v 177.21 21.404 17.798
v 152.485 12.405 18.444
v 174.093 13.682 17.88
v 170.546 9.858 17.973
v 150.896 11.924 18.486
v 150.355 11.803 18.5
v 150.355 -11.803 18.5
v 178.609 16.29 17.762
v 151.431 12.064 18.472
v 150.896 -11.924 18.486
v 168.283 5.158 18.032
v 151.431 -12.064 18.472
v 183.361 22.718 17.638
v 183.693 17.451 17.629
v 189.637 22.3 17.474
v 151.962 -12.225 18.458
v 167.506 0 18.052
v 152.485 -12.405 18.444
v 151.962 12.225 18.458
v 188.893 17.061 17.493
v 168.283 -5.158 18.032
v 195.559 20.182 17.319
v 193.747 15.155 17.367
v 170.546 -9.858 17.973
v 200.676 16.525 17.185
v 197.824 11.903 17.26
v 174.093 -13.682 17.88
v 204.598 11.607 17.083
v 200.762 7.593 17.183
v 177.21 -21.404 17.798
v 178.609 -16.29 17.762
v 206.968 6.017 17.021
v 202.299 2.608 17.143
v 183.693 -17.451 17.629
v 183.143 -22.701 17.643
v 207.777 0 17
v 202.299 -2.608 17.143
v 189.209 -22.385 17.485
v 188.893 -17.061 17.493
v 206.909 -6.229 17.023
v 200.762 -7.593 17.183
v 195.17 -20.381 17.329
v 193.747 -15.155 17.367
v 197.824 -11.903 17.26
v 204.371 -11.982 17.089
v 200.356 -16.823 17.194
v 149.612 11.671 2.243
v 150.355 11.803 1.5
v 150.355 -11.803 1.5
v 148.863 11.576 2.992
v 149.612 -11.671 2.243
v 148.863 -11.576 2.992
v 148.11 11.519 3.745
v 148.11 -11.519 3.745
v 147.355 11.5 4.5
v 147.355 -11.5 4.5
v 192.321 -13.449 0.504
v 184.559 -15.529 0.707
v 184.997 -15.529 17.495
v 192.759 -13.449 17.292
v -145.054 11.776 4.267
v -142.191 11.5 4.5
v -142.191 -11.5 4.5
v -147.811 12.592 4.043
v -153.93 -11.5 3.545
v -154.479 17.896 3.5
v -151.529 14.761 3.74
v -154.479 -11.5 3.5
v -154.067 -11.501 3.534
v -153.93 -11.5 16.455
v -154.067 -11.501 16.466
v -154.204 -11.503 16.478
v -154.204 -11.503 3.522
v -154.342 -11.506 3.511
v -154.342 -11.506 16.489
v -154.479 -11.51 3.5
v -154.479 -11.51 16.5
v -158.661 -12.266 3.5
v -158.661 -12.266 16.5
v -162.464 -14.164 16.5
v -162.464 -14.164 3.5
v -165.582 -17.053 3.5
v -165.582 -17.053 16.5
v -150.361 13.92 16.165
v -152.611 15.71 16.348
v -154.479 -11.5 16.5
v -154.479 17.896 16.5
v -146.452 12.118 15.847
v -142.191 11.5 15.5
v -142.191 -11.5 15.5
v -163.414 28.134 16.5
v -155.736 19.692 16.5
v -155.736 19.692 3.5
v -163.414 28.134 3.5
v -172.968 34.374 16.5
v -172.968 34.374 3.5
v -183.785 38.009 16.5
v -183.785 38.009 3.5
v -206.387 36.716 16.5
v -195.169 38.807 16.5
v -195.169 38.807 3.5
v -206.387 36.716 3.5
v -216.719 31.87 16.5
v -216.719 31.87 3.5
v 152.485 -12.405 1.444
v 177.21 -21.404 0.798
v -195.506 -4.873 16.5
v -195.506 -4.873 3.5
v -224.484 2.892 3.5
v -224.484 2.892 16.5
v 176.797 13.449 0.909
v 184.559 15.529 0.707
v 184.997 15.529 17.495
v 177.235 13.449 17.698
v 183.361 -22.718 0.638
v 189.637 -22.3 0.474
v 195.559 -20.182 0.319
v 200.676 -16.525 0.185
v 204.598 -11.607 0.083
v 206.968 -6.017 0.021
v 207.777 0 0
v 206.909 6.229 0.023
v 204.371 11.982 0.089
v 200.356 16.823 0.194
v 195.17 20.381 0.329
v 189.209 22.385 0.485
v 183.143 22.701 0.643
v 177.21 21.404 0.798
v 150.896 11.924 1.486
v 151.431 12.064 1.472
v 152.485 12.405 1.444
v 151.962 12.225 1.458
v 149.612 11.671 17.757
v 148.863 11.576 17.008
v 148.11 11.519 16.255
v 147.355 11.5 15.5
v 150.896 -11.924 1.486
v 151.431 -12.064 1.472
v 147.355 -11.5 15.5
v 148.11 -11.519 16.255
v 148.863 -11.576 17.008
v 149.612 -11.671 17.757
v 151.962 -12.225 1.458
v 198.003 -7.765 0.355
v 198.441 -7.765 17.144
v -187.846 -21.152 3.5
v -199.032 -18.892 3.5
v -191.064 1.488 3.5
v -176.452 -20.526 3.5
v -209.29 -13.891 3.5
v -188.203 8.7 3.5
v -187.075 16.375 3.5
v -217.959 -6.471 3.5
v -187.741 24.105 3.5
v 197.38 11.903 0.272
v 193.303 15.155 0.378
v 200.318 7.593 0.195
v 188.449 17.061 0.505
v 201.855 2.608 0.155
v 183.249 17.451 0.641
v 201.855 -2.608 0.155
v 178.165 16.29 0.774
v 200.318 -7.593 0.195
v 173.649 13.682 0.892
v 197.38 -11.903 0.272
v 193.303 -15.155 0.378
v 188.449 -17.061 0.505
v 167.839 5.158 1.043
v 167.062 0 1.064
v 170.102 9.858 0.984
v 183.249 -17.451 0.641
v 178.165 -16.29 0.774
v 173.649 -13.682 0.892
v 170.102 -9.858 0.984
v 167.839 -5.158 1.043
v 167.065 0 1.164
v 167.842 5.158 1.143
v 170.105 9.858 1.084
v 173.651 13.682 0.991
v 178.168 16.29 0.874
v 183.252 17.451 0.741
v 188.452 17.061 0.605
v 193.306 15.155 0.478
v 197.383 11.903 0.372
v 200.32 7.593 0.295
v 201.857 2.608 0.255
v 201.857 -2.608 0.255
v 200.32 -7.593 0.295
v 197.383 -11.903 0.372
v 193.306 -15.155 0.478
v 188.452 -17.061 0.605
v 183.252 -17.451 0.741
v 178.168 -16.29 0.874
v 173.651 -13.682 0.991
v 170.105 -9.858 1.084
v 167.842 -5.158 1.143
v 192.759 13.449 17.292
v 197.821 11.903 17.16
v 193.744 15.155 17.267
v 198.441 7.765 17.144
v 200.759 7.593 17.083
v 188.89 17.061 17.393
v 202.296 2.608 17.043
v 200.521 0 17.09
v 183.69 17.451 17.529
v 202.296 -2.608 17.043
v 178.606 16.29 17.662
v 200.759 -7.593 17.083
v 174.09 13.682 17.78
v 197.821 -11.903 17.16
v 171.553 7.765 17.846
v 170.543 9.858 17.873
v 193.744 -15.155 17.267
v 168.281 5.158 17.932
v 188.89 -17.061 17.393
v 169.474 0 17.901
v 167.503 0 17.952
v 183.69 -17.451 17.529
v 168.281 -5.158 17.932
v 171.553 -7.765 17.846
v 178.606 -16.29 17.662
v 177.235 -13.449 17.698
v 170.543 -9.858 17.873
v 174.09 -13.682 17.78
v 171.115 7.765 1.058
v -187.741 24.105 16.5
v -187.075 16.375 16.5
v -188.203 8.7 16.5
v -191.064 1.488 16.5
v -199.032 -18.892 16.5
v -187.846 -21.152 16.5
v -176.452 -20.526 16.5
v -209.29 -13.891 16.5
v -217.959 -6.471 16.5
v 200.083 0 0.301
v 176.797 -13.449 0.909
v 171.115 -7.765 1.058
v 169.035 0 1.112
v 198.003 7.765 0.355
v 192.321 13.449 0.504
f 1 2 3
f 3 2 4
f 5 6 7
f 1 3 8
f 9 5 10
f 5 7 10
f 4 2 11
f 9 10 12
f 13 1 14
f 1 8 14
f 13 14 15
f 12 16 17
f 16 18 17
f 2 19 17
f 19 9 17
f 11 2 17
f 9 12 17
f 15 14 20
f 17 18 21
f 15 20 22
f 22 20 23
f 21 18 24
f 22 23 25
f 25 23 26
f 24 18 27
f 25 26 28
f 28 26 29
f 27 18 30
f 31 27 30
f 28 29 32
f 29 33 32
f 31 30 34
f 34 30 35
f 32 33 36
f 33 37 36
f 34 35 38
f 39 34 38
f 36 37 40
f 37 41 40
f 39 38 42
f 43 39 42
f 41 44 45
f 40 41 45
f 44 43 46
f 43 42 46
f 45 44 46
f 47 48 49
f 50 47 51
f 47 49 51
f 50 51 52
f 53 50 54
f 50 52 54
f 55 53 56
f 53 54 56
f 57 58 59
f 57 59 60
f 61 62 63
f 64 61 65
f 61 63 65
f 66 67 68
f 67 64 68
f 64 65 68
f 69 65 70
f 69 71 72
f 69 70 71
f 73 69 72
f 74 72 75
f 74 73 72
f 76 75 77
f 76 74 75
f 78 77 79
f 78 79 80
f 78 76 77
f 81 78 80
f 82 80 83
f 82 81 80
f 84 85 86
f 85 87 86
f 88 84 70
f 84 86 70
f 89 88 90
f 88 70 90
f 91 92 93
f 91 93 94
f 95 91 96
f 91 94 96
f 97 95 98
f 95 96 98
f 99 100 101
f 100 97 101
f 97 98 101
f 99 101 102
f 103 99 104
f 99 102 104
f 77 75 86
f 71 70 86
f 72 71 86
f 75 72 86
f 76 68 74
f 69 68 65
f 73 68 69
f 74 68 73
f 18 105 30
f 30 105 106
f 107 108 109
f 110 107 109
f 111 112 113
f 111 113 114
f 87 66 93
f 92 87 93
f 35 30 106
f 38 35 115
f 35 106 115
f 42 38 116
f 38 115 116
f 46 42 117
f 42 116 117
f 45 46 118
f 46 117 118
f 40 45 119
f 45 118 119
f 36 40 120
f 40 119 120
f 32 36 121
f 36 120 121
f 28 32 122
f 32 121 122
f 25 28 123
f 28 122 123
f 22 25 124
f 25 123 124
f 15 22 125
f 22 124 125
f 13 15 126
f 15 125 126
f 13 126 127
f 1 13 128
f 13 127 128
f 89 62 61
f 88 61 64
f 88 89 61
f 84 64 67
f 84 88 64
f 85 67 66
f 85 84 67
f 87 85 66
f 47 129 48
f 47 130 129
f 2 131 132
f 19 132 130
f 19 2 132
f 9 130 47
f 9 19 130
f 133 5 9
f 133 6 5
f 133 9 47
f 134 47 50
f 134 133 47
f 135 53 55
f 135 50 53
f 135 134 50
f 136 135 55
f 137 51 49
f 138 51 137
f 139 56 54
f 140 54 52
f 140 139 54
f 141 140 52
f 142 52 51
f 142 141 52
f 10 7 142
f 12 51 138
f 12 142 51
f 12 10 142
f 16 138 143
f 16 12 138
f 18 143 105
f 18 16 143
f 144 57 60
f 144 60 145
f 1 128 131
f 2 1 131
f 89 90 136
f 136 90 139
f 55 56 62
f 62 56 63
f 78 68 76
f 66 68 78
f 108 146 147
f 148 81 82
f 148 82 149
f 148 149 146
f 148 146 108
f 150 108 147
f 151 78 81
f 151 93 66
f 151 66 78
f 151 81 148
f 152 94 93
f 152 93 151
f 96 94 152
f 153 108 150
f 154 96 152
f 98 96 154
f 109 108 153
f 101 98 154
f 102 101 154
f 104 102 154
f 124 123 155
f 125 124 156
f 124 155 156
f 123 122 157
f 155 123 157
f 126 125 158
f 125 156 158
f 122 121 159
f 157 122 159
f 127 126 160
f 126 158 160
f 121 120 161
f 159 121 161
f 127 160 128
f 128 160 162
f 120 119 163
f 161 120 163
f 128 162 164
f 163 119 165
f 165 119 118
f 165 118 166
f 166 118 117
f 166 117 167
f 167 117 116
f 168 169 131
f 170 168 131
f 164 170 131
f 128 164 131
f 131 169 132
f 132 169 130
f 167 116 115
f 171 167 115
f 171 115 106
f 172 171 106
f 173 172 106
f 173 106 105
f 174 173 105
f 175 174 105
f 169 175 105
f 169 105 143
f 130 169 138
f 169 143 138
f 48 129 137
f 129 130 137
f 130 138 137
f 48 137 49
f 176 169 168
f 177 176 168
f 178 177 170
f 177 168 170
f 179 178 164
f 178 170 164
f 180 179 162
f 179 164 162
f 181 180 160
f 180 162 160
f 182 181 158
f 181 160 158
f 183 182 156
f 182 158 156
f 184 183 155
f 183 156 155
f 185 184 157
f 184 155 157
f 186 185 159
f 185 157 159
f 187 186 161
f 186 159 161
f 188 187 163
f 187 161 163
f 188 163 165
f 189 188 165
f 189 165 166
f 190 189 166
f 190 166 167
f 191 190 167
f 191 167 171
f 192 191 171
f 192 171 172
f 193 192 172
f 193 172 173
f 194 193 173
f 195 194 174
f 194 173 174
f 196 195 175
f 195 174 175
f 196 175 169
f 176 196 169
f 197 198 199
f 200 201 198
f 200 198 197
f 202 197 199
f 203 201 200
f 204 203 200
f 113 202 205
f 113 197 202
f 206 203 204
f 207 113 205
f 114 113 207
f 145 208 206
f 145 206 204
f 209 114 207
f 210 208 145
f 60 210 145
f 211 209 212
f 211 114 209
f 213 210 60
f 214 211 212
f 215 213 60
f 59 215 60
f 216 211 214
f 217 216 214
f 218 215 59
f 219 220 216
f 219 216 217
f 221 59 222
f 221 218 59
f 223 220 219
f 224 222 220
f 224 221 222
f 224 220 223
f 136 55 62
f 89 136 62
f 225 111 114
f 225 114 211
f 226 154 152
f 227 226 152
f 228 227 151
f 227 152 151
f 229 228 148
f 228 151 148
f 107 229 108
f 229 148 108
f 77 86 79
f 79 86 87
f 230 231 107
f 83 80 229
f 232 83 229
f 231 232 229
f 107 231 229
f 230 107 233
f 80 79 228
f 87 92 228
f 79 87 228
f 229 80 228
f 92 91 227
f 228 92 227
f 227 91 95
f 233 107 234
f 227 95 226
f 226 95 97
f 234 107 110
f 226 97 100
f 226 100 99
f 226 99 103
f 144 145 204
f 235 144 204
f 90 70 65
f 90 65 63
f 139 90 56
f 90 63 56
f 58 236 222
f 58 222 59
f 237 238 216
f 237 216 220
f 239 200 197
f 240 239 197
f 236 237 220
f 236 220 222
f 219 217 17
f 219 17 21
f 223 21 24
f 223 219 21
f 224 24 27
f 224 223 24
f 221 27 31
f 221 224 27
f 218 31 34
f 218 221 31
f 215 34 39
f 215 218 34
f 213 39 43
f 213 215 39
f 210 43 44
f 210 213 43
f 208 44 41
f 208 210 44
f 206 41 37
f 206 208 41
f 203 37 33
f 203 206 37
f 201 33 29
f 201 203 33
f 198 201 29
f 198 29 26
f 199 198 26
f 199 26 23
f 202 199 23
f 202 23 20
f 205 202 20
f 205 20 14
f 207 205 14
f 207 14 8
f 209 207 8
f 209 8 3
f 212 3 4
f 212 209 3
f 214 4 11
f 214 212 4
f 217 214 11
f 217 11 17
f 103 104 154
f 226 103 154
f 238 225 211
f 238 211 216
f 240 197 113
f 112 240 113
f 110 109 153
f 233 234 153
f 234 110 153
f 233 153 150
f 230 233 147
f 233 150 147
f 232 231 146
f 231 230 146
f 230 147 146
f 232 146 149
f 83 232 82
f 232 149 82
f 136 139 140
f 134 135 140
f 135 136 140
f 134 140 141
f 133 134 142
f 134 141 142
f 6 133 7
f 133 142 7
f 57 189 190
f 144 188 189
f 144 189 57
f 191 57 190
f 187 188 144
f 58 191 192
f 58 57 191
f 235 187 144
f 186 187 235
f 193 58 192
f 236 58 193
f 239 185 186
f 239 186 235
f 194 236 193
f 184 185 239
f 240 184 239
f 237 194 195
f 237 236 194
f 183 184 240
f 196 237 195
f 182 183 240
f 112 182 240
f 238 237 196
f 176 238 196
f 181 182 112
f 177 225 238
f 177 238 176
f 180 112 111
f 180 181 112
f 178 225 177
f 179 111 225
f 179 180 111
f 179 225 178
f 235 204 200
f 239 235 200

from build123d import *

# Parameters (mm, degrees)
AUFSATZ_LINEAR_AUSTRAGEN2_DEPTH      = 20
VERRUNDUNG1_R                        = 15
SCHNITT_LINEAR_AUSTRAGEN3_DEPTH      = 229.701880893
SCHNITT_LINEAR_AUSTRAGEN3_DEPTH_BACK = 229.701880893
SKIZZE5_OUTSIDE_W                    = 521.679
SKIZZE5_OUTSIDE_H                    = 109.418
SCHNITT_LINEAR_AUSTRAGEN6_DEPTH      = 228.676613663
SKIZZE7_R                            = 17.5
SCHNITT_LINEAR_AUSTRAGEN5_DEPTH      = 0.1
SCHNITT_LINEAR_START                 = -0.1
SKIZZE9_R                            = 17.5
SCHNITT_LINEAR_AUSTRAGEN7_DEPTH      = 0.1
VERRUNDUNG5_R                        = 15


with BuildPart() as part:
    # Skizze1 → Aufsatz-Linear austragen2 (new body)
    with BuildSketch(Plane.XY):
        with BuildLine():
            Line((-216.718948666, 31.869537692), (-187.741173877, 24.104966339))
            ThreePointArc((-187.741173877, 24.104966339), (-188.20309721, 8.699595617), (-195.50574523, -4.87280845))
            Line((-195.50574523, -4.87280845), (-224.483520019, 2.891762903))
            ThreePointArc((-224.483520019, 2.891762903), (-199.032056143, -18.892233896), (-165.581524585, -17.053356943))
            Line((-165.581524585, -17.053356943), (-161.471528727, -11.5))
            Line((-161.471528727, -11.5), (150, -11.5))
            Line((150, -11.5), (177.209748999, -21.403538717))
            ThreePointArc((177.209748999, -21.403538717), (207.777170155, 0), (177.209748999, 21.403538717))
            Line((177.209748999, 21.403538717), (150, 11.5))
            Line((150, 11.5), (-150, 11.5))
            Line((-150, 11.5), (-155.735764364, 19.691520443))
            ThreePointArc((-155.735764364, 19.691520443), (-183.785335986, 38.009300378), (-216.718948666, 31.869537692))
        make_face()
    extrude(amount=AUFSATZ_LINEAR_AUSTRAGEN2_DEPTH)

    # Verrundung1
    verrundung1_edges = [part.edges().sort_by_distance(p)[0] for p in [
        (-150, 11.5, 10),
        (150, 11.5, 10),
        (150, -11.5, 10),
    ]]
    fillet(verrundung1_edges, radius=VERRUNDUNG1_R)

    # Skizze5 outside → Schnitt-Linear austragen3 (cut, two sides: drawn at the far end of the back side and taken through both)
    with BuildSketch(Plane(origin=(0, 0, 0), x_dir=(1, 0, 0), z_dir=(0, 1, 0)).offset(-SCHNITT_LINEAR_AUSTRAGEN3_DEPTH_BACK)):
        with Locations((-8.3535, -10)):
            Rectangle(SKIZZE5_OUTSIDE_W, SKIZZE5_OUTSIDE_H)
        Polygon((147.355095289, -15.5), (150.355095289, -18.5), (207.777170155, -17), (207.777170155, 0), (150.355095289, -1.5), (147.355095289, -4.5), (-142.191494242, -4.5), (-154.478774906, -3.5), (-224.483520019, -3.5), (-224.483520019, -16.5), (-154.478774906, -16.5), (-142.191494242, -15.5), align=None, mode=Mode.SUBTRACT)
    extrude(amount=SCHNITT_LINEAR_AUSTRAGEN3_DEPTH + SCHNITT_LINEAR_AUSTRAGEN3_DEPTH_BACK, mode=Mode.SUBTRACT)

    # Skizze8 → Schnitt-Linear austragen6 (cut, through all)
    with BuildSketch(Plane(origin=(-1.278585019, 0, 22.46102929), x_dir=(0.9996589857202393, 0, -0.026113449959408383), z_dir=(0.026113449959408383, 0, 0.9996589857202393))):
        Polygon((201.871273052, 0), (199.790762428, 7.764571353), (194.106701699, 13.448632083), (186.342130346, 15.529142706), (178.577558993, 13.448632083), (172.893498263, 7.764571353), (170.81298764, 0), (172.893498263, -7.764571353), (178.577558993, -13.448632083), (186.342130346, -15.529142706), (194.106701699, -13.448632083), (199.790762428, -7.764571353), align=None)
    extrude(amount=-SCHNITT_LINEAR_AUSTRAGEN6_DEPTH, mode=Mode.SUBTRACT)

    # Skizze7 → Schnitt-Linear austragen5 (cut)
    with BuildSketch(Plane(origin=(-0.373956847, 0, 5.437398269), x_dir=(-0.9996589857202394, 0, 0.026113449959408383), z_dir=(-0.026113449959408383, 0, -0.9996589857202394))):
        with Locations((-184.993264929, 0)):
            Circle(SKIZZE7_R)
    extrude(amount=-SCHNITT_LINEAR_AUSTRAGEN5_DEPTH, mode=Mode.SUBTRACT)

    # Skizze9 → Schnitt-Linear austragen7 (cut)
    with BuildSketch(Plane(origin=(0.585463065, 0, 22.412335959), x_dir=(0.9996589857202393, 0, -0.026113449959408383), z_dir=(0.026113449959408383, 0, 0.9996589857202393)).offset(SCHNITT_LINEAR_START)):
        with Locations(Location((184.477446379, 0, 0), (0, 0, 180))):
            Circle(SKIZZE9_R)
    extrude(amount=SCHNITT_LINEAR_AUSTRAGEN7_DEPTH, mode=Mode.SUBTRACT)

    # Verrundung5
    # the kernel refuses this fillet: 15 mm, written as the material it adds along each edge
    with BuildSketch(Plane(origin=(-161.471528727, -11.5, 3.5), x_dir=(1, 0, 0), z_dir=(0, 0, 1))) as verrundung5_piece_1_section:
        with BuildLine():
            CenterArc((7.541653594, -15), VERRUNDUNG5_R, 90, 50.96638681)
            Line((-4.109995858, -5.553356943), (-4.343028847, -5.364424082))
            ThreePointArc((-4.343028847, -5.364424082), (-2.296139873, -2.598211212), (-0.241141944, 0.178467259))
            Line((-0.241141944, 0.178467259), (0, 0.3))
            Line((0, 0.3), (7.541653594, 0.3))
            Line((7.541653594, 0.3), (7.541653594, 0))
        make_face()
    verrundung5_piece_1 = extrude(amount=13, mode=Mode.PRIVATE)
    verrundung5_piece_1 = split(verrundung5_piece_1, bisect_by=Plane(origin=(-154.879802837, -11.415872576, 16.532637647), z_dir=(-0.08111677690648599, 0, -0.9967046044361908)), keep=Keep.TOP, mode=Mode.PRIVATE)
    verrundung5_piece_1 = split(verrundung5_piece_1, bisect_by=Plane(origin=(-154.879802837, -11.415872576, 3.467362353), z_dir=(-0.08111677690648603, 0, 0.9967046044361908)), keep=Keep.TOP, mode=Mode.PRIVATE)
    add(verrundung5_piece_1)


solid = part.part
